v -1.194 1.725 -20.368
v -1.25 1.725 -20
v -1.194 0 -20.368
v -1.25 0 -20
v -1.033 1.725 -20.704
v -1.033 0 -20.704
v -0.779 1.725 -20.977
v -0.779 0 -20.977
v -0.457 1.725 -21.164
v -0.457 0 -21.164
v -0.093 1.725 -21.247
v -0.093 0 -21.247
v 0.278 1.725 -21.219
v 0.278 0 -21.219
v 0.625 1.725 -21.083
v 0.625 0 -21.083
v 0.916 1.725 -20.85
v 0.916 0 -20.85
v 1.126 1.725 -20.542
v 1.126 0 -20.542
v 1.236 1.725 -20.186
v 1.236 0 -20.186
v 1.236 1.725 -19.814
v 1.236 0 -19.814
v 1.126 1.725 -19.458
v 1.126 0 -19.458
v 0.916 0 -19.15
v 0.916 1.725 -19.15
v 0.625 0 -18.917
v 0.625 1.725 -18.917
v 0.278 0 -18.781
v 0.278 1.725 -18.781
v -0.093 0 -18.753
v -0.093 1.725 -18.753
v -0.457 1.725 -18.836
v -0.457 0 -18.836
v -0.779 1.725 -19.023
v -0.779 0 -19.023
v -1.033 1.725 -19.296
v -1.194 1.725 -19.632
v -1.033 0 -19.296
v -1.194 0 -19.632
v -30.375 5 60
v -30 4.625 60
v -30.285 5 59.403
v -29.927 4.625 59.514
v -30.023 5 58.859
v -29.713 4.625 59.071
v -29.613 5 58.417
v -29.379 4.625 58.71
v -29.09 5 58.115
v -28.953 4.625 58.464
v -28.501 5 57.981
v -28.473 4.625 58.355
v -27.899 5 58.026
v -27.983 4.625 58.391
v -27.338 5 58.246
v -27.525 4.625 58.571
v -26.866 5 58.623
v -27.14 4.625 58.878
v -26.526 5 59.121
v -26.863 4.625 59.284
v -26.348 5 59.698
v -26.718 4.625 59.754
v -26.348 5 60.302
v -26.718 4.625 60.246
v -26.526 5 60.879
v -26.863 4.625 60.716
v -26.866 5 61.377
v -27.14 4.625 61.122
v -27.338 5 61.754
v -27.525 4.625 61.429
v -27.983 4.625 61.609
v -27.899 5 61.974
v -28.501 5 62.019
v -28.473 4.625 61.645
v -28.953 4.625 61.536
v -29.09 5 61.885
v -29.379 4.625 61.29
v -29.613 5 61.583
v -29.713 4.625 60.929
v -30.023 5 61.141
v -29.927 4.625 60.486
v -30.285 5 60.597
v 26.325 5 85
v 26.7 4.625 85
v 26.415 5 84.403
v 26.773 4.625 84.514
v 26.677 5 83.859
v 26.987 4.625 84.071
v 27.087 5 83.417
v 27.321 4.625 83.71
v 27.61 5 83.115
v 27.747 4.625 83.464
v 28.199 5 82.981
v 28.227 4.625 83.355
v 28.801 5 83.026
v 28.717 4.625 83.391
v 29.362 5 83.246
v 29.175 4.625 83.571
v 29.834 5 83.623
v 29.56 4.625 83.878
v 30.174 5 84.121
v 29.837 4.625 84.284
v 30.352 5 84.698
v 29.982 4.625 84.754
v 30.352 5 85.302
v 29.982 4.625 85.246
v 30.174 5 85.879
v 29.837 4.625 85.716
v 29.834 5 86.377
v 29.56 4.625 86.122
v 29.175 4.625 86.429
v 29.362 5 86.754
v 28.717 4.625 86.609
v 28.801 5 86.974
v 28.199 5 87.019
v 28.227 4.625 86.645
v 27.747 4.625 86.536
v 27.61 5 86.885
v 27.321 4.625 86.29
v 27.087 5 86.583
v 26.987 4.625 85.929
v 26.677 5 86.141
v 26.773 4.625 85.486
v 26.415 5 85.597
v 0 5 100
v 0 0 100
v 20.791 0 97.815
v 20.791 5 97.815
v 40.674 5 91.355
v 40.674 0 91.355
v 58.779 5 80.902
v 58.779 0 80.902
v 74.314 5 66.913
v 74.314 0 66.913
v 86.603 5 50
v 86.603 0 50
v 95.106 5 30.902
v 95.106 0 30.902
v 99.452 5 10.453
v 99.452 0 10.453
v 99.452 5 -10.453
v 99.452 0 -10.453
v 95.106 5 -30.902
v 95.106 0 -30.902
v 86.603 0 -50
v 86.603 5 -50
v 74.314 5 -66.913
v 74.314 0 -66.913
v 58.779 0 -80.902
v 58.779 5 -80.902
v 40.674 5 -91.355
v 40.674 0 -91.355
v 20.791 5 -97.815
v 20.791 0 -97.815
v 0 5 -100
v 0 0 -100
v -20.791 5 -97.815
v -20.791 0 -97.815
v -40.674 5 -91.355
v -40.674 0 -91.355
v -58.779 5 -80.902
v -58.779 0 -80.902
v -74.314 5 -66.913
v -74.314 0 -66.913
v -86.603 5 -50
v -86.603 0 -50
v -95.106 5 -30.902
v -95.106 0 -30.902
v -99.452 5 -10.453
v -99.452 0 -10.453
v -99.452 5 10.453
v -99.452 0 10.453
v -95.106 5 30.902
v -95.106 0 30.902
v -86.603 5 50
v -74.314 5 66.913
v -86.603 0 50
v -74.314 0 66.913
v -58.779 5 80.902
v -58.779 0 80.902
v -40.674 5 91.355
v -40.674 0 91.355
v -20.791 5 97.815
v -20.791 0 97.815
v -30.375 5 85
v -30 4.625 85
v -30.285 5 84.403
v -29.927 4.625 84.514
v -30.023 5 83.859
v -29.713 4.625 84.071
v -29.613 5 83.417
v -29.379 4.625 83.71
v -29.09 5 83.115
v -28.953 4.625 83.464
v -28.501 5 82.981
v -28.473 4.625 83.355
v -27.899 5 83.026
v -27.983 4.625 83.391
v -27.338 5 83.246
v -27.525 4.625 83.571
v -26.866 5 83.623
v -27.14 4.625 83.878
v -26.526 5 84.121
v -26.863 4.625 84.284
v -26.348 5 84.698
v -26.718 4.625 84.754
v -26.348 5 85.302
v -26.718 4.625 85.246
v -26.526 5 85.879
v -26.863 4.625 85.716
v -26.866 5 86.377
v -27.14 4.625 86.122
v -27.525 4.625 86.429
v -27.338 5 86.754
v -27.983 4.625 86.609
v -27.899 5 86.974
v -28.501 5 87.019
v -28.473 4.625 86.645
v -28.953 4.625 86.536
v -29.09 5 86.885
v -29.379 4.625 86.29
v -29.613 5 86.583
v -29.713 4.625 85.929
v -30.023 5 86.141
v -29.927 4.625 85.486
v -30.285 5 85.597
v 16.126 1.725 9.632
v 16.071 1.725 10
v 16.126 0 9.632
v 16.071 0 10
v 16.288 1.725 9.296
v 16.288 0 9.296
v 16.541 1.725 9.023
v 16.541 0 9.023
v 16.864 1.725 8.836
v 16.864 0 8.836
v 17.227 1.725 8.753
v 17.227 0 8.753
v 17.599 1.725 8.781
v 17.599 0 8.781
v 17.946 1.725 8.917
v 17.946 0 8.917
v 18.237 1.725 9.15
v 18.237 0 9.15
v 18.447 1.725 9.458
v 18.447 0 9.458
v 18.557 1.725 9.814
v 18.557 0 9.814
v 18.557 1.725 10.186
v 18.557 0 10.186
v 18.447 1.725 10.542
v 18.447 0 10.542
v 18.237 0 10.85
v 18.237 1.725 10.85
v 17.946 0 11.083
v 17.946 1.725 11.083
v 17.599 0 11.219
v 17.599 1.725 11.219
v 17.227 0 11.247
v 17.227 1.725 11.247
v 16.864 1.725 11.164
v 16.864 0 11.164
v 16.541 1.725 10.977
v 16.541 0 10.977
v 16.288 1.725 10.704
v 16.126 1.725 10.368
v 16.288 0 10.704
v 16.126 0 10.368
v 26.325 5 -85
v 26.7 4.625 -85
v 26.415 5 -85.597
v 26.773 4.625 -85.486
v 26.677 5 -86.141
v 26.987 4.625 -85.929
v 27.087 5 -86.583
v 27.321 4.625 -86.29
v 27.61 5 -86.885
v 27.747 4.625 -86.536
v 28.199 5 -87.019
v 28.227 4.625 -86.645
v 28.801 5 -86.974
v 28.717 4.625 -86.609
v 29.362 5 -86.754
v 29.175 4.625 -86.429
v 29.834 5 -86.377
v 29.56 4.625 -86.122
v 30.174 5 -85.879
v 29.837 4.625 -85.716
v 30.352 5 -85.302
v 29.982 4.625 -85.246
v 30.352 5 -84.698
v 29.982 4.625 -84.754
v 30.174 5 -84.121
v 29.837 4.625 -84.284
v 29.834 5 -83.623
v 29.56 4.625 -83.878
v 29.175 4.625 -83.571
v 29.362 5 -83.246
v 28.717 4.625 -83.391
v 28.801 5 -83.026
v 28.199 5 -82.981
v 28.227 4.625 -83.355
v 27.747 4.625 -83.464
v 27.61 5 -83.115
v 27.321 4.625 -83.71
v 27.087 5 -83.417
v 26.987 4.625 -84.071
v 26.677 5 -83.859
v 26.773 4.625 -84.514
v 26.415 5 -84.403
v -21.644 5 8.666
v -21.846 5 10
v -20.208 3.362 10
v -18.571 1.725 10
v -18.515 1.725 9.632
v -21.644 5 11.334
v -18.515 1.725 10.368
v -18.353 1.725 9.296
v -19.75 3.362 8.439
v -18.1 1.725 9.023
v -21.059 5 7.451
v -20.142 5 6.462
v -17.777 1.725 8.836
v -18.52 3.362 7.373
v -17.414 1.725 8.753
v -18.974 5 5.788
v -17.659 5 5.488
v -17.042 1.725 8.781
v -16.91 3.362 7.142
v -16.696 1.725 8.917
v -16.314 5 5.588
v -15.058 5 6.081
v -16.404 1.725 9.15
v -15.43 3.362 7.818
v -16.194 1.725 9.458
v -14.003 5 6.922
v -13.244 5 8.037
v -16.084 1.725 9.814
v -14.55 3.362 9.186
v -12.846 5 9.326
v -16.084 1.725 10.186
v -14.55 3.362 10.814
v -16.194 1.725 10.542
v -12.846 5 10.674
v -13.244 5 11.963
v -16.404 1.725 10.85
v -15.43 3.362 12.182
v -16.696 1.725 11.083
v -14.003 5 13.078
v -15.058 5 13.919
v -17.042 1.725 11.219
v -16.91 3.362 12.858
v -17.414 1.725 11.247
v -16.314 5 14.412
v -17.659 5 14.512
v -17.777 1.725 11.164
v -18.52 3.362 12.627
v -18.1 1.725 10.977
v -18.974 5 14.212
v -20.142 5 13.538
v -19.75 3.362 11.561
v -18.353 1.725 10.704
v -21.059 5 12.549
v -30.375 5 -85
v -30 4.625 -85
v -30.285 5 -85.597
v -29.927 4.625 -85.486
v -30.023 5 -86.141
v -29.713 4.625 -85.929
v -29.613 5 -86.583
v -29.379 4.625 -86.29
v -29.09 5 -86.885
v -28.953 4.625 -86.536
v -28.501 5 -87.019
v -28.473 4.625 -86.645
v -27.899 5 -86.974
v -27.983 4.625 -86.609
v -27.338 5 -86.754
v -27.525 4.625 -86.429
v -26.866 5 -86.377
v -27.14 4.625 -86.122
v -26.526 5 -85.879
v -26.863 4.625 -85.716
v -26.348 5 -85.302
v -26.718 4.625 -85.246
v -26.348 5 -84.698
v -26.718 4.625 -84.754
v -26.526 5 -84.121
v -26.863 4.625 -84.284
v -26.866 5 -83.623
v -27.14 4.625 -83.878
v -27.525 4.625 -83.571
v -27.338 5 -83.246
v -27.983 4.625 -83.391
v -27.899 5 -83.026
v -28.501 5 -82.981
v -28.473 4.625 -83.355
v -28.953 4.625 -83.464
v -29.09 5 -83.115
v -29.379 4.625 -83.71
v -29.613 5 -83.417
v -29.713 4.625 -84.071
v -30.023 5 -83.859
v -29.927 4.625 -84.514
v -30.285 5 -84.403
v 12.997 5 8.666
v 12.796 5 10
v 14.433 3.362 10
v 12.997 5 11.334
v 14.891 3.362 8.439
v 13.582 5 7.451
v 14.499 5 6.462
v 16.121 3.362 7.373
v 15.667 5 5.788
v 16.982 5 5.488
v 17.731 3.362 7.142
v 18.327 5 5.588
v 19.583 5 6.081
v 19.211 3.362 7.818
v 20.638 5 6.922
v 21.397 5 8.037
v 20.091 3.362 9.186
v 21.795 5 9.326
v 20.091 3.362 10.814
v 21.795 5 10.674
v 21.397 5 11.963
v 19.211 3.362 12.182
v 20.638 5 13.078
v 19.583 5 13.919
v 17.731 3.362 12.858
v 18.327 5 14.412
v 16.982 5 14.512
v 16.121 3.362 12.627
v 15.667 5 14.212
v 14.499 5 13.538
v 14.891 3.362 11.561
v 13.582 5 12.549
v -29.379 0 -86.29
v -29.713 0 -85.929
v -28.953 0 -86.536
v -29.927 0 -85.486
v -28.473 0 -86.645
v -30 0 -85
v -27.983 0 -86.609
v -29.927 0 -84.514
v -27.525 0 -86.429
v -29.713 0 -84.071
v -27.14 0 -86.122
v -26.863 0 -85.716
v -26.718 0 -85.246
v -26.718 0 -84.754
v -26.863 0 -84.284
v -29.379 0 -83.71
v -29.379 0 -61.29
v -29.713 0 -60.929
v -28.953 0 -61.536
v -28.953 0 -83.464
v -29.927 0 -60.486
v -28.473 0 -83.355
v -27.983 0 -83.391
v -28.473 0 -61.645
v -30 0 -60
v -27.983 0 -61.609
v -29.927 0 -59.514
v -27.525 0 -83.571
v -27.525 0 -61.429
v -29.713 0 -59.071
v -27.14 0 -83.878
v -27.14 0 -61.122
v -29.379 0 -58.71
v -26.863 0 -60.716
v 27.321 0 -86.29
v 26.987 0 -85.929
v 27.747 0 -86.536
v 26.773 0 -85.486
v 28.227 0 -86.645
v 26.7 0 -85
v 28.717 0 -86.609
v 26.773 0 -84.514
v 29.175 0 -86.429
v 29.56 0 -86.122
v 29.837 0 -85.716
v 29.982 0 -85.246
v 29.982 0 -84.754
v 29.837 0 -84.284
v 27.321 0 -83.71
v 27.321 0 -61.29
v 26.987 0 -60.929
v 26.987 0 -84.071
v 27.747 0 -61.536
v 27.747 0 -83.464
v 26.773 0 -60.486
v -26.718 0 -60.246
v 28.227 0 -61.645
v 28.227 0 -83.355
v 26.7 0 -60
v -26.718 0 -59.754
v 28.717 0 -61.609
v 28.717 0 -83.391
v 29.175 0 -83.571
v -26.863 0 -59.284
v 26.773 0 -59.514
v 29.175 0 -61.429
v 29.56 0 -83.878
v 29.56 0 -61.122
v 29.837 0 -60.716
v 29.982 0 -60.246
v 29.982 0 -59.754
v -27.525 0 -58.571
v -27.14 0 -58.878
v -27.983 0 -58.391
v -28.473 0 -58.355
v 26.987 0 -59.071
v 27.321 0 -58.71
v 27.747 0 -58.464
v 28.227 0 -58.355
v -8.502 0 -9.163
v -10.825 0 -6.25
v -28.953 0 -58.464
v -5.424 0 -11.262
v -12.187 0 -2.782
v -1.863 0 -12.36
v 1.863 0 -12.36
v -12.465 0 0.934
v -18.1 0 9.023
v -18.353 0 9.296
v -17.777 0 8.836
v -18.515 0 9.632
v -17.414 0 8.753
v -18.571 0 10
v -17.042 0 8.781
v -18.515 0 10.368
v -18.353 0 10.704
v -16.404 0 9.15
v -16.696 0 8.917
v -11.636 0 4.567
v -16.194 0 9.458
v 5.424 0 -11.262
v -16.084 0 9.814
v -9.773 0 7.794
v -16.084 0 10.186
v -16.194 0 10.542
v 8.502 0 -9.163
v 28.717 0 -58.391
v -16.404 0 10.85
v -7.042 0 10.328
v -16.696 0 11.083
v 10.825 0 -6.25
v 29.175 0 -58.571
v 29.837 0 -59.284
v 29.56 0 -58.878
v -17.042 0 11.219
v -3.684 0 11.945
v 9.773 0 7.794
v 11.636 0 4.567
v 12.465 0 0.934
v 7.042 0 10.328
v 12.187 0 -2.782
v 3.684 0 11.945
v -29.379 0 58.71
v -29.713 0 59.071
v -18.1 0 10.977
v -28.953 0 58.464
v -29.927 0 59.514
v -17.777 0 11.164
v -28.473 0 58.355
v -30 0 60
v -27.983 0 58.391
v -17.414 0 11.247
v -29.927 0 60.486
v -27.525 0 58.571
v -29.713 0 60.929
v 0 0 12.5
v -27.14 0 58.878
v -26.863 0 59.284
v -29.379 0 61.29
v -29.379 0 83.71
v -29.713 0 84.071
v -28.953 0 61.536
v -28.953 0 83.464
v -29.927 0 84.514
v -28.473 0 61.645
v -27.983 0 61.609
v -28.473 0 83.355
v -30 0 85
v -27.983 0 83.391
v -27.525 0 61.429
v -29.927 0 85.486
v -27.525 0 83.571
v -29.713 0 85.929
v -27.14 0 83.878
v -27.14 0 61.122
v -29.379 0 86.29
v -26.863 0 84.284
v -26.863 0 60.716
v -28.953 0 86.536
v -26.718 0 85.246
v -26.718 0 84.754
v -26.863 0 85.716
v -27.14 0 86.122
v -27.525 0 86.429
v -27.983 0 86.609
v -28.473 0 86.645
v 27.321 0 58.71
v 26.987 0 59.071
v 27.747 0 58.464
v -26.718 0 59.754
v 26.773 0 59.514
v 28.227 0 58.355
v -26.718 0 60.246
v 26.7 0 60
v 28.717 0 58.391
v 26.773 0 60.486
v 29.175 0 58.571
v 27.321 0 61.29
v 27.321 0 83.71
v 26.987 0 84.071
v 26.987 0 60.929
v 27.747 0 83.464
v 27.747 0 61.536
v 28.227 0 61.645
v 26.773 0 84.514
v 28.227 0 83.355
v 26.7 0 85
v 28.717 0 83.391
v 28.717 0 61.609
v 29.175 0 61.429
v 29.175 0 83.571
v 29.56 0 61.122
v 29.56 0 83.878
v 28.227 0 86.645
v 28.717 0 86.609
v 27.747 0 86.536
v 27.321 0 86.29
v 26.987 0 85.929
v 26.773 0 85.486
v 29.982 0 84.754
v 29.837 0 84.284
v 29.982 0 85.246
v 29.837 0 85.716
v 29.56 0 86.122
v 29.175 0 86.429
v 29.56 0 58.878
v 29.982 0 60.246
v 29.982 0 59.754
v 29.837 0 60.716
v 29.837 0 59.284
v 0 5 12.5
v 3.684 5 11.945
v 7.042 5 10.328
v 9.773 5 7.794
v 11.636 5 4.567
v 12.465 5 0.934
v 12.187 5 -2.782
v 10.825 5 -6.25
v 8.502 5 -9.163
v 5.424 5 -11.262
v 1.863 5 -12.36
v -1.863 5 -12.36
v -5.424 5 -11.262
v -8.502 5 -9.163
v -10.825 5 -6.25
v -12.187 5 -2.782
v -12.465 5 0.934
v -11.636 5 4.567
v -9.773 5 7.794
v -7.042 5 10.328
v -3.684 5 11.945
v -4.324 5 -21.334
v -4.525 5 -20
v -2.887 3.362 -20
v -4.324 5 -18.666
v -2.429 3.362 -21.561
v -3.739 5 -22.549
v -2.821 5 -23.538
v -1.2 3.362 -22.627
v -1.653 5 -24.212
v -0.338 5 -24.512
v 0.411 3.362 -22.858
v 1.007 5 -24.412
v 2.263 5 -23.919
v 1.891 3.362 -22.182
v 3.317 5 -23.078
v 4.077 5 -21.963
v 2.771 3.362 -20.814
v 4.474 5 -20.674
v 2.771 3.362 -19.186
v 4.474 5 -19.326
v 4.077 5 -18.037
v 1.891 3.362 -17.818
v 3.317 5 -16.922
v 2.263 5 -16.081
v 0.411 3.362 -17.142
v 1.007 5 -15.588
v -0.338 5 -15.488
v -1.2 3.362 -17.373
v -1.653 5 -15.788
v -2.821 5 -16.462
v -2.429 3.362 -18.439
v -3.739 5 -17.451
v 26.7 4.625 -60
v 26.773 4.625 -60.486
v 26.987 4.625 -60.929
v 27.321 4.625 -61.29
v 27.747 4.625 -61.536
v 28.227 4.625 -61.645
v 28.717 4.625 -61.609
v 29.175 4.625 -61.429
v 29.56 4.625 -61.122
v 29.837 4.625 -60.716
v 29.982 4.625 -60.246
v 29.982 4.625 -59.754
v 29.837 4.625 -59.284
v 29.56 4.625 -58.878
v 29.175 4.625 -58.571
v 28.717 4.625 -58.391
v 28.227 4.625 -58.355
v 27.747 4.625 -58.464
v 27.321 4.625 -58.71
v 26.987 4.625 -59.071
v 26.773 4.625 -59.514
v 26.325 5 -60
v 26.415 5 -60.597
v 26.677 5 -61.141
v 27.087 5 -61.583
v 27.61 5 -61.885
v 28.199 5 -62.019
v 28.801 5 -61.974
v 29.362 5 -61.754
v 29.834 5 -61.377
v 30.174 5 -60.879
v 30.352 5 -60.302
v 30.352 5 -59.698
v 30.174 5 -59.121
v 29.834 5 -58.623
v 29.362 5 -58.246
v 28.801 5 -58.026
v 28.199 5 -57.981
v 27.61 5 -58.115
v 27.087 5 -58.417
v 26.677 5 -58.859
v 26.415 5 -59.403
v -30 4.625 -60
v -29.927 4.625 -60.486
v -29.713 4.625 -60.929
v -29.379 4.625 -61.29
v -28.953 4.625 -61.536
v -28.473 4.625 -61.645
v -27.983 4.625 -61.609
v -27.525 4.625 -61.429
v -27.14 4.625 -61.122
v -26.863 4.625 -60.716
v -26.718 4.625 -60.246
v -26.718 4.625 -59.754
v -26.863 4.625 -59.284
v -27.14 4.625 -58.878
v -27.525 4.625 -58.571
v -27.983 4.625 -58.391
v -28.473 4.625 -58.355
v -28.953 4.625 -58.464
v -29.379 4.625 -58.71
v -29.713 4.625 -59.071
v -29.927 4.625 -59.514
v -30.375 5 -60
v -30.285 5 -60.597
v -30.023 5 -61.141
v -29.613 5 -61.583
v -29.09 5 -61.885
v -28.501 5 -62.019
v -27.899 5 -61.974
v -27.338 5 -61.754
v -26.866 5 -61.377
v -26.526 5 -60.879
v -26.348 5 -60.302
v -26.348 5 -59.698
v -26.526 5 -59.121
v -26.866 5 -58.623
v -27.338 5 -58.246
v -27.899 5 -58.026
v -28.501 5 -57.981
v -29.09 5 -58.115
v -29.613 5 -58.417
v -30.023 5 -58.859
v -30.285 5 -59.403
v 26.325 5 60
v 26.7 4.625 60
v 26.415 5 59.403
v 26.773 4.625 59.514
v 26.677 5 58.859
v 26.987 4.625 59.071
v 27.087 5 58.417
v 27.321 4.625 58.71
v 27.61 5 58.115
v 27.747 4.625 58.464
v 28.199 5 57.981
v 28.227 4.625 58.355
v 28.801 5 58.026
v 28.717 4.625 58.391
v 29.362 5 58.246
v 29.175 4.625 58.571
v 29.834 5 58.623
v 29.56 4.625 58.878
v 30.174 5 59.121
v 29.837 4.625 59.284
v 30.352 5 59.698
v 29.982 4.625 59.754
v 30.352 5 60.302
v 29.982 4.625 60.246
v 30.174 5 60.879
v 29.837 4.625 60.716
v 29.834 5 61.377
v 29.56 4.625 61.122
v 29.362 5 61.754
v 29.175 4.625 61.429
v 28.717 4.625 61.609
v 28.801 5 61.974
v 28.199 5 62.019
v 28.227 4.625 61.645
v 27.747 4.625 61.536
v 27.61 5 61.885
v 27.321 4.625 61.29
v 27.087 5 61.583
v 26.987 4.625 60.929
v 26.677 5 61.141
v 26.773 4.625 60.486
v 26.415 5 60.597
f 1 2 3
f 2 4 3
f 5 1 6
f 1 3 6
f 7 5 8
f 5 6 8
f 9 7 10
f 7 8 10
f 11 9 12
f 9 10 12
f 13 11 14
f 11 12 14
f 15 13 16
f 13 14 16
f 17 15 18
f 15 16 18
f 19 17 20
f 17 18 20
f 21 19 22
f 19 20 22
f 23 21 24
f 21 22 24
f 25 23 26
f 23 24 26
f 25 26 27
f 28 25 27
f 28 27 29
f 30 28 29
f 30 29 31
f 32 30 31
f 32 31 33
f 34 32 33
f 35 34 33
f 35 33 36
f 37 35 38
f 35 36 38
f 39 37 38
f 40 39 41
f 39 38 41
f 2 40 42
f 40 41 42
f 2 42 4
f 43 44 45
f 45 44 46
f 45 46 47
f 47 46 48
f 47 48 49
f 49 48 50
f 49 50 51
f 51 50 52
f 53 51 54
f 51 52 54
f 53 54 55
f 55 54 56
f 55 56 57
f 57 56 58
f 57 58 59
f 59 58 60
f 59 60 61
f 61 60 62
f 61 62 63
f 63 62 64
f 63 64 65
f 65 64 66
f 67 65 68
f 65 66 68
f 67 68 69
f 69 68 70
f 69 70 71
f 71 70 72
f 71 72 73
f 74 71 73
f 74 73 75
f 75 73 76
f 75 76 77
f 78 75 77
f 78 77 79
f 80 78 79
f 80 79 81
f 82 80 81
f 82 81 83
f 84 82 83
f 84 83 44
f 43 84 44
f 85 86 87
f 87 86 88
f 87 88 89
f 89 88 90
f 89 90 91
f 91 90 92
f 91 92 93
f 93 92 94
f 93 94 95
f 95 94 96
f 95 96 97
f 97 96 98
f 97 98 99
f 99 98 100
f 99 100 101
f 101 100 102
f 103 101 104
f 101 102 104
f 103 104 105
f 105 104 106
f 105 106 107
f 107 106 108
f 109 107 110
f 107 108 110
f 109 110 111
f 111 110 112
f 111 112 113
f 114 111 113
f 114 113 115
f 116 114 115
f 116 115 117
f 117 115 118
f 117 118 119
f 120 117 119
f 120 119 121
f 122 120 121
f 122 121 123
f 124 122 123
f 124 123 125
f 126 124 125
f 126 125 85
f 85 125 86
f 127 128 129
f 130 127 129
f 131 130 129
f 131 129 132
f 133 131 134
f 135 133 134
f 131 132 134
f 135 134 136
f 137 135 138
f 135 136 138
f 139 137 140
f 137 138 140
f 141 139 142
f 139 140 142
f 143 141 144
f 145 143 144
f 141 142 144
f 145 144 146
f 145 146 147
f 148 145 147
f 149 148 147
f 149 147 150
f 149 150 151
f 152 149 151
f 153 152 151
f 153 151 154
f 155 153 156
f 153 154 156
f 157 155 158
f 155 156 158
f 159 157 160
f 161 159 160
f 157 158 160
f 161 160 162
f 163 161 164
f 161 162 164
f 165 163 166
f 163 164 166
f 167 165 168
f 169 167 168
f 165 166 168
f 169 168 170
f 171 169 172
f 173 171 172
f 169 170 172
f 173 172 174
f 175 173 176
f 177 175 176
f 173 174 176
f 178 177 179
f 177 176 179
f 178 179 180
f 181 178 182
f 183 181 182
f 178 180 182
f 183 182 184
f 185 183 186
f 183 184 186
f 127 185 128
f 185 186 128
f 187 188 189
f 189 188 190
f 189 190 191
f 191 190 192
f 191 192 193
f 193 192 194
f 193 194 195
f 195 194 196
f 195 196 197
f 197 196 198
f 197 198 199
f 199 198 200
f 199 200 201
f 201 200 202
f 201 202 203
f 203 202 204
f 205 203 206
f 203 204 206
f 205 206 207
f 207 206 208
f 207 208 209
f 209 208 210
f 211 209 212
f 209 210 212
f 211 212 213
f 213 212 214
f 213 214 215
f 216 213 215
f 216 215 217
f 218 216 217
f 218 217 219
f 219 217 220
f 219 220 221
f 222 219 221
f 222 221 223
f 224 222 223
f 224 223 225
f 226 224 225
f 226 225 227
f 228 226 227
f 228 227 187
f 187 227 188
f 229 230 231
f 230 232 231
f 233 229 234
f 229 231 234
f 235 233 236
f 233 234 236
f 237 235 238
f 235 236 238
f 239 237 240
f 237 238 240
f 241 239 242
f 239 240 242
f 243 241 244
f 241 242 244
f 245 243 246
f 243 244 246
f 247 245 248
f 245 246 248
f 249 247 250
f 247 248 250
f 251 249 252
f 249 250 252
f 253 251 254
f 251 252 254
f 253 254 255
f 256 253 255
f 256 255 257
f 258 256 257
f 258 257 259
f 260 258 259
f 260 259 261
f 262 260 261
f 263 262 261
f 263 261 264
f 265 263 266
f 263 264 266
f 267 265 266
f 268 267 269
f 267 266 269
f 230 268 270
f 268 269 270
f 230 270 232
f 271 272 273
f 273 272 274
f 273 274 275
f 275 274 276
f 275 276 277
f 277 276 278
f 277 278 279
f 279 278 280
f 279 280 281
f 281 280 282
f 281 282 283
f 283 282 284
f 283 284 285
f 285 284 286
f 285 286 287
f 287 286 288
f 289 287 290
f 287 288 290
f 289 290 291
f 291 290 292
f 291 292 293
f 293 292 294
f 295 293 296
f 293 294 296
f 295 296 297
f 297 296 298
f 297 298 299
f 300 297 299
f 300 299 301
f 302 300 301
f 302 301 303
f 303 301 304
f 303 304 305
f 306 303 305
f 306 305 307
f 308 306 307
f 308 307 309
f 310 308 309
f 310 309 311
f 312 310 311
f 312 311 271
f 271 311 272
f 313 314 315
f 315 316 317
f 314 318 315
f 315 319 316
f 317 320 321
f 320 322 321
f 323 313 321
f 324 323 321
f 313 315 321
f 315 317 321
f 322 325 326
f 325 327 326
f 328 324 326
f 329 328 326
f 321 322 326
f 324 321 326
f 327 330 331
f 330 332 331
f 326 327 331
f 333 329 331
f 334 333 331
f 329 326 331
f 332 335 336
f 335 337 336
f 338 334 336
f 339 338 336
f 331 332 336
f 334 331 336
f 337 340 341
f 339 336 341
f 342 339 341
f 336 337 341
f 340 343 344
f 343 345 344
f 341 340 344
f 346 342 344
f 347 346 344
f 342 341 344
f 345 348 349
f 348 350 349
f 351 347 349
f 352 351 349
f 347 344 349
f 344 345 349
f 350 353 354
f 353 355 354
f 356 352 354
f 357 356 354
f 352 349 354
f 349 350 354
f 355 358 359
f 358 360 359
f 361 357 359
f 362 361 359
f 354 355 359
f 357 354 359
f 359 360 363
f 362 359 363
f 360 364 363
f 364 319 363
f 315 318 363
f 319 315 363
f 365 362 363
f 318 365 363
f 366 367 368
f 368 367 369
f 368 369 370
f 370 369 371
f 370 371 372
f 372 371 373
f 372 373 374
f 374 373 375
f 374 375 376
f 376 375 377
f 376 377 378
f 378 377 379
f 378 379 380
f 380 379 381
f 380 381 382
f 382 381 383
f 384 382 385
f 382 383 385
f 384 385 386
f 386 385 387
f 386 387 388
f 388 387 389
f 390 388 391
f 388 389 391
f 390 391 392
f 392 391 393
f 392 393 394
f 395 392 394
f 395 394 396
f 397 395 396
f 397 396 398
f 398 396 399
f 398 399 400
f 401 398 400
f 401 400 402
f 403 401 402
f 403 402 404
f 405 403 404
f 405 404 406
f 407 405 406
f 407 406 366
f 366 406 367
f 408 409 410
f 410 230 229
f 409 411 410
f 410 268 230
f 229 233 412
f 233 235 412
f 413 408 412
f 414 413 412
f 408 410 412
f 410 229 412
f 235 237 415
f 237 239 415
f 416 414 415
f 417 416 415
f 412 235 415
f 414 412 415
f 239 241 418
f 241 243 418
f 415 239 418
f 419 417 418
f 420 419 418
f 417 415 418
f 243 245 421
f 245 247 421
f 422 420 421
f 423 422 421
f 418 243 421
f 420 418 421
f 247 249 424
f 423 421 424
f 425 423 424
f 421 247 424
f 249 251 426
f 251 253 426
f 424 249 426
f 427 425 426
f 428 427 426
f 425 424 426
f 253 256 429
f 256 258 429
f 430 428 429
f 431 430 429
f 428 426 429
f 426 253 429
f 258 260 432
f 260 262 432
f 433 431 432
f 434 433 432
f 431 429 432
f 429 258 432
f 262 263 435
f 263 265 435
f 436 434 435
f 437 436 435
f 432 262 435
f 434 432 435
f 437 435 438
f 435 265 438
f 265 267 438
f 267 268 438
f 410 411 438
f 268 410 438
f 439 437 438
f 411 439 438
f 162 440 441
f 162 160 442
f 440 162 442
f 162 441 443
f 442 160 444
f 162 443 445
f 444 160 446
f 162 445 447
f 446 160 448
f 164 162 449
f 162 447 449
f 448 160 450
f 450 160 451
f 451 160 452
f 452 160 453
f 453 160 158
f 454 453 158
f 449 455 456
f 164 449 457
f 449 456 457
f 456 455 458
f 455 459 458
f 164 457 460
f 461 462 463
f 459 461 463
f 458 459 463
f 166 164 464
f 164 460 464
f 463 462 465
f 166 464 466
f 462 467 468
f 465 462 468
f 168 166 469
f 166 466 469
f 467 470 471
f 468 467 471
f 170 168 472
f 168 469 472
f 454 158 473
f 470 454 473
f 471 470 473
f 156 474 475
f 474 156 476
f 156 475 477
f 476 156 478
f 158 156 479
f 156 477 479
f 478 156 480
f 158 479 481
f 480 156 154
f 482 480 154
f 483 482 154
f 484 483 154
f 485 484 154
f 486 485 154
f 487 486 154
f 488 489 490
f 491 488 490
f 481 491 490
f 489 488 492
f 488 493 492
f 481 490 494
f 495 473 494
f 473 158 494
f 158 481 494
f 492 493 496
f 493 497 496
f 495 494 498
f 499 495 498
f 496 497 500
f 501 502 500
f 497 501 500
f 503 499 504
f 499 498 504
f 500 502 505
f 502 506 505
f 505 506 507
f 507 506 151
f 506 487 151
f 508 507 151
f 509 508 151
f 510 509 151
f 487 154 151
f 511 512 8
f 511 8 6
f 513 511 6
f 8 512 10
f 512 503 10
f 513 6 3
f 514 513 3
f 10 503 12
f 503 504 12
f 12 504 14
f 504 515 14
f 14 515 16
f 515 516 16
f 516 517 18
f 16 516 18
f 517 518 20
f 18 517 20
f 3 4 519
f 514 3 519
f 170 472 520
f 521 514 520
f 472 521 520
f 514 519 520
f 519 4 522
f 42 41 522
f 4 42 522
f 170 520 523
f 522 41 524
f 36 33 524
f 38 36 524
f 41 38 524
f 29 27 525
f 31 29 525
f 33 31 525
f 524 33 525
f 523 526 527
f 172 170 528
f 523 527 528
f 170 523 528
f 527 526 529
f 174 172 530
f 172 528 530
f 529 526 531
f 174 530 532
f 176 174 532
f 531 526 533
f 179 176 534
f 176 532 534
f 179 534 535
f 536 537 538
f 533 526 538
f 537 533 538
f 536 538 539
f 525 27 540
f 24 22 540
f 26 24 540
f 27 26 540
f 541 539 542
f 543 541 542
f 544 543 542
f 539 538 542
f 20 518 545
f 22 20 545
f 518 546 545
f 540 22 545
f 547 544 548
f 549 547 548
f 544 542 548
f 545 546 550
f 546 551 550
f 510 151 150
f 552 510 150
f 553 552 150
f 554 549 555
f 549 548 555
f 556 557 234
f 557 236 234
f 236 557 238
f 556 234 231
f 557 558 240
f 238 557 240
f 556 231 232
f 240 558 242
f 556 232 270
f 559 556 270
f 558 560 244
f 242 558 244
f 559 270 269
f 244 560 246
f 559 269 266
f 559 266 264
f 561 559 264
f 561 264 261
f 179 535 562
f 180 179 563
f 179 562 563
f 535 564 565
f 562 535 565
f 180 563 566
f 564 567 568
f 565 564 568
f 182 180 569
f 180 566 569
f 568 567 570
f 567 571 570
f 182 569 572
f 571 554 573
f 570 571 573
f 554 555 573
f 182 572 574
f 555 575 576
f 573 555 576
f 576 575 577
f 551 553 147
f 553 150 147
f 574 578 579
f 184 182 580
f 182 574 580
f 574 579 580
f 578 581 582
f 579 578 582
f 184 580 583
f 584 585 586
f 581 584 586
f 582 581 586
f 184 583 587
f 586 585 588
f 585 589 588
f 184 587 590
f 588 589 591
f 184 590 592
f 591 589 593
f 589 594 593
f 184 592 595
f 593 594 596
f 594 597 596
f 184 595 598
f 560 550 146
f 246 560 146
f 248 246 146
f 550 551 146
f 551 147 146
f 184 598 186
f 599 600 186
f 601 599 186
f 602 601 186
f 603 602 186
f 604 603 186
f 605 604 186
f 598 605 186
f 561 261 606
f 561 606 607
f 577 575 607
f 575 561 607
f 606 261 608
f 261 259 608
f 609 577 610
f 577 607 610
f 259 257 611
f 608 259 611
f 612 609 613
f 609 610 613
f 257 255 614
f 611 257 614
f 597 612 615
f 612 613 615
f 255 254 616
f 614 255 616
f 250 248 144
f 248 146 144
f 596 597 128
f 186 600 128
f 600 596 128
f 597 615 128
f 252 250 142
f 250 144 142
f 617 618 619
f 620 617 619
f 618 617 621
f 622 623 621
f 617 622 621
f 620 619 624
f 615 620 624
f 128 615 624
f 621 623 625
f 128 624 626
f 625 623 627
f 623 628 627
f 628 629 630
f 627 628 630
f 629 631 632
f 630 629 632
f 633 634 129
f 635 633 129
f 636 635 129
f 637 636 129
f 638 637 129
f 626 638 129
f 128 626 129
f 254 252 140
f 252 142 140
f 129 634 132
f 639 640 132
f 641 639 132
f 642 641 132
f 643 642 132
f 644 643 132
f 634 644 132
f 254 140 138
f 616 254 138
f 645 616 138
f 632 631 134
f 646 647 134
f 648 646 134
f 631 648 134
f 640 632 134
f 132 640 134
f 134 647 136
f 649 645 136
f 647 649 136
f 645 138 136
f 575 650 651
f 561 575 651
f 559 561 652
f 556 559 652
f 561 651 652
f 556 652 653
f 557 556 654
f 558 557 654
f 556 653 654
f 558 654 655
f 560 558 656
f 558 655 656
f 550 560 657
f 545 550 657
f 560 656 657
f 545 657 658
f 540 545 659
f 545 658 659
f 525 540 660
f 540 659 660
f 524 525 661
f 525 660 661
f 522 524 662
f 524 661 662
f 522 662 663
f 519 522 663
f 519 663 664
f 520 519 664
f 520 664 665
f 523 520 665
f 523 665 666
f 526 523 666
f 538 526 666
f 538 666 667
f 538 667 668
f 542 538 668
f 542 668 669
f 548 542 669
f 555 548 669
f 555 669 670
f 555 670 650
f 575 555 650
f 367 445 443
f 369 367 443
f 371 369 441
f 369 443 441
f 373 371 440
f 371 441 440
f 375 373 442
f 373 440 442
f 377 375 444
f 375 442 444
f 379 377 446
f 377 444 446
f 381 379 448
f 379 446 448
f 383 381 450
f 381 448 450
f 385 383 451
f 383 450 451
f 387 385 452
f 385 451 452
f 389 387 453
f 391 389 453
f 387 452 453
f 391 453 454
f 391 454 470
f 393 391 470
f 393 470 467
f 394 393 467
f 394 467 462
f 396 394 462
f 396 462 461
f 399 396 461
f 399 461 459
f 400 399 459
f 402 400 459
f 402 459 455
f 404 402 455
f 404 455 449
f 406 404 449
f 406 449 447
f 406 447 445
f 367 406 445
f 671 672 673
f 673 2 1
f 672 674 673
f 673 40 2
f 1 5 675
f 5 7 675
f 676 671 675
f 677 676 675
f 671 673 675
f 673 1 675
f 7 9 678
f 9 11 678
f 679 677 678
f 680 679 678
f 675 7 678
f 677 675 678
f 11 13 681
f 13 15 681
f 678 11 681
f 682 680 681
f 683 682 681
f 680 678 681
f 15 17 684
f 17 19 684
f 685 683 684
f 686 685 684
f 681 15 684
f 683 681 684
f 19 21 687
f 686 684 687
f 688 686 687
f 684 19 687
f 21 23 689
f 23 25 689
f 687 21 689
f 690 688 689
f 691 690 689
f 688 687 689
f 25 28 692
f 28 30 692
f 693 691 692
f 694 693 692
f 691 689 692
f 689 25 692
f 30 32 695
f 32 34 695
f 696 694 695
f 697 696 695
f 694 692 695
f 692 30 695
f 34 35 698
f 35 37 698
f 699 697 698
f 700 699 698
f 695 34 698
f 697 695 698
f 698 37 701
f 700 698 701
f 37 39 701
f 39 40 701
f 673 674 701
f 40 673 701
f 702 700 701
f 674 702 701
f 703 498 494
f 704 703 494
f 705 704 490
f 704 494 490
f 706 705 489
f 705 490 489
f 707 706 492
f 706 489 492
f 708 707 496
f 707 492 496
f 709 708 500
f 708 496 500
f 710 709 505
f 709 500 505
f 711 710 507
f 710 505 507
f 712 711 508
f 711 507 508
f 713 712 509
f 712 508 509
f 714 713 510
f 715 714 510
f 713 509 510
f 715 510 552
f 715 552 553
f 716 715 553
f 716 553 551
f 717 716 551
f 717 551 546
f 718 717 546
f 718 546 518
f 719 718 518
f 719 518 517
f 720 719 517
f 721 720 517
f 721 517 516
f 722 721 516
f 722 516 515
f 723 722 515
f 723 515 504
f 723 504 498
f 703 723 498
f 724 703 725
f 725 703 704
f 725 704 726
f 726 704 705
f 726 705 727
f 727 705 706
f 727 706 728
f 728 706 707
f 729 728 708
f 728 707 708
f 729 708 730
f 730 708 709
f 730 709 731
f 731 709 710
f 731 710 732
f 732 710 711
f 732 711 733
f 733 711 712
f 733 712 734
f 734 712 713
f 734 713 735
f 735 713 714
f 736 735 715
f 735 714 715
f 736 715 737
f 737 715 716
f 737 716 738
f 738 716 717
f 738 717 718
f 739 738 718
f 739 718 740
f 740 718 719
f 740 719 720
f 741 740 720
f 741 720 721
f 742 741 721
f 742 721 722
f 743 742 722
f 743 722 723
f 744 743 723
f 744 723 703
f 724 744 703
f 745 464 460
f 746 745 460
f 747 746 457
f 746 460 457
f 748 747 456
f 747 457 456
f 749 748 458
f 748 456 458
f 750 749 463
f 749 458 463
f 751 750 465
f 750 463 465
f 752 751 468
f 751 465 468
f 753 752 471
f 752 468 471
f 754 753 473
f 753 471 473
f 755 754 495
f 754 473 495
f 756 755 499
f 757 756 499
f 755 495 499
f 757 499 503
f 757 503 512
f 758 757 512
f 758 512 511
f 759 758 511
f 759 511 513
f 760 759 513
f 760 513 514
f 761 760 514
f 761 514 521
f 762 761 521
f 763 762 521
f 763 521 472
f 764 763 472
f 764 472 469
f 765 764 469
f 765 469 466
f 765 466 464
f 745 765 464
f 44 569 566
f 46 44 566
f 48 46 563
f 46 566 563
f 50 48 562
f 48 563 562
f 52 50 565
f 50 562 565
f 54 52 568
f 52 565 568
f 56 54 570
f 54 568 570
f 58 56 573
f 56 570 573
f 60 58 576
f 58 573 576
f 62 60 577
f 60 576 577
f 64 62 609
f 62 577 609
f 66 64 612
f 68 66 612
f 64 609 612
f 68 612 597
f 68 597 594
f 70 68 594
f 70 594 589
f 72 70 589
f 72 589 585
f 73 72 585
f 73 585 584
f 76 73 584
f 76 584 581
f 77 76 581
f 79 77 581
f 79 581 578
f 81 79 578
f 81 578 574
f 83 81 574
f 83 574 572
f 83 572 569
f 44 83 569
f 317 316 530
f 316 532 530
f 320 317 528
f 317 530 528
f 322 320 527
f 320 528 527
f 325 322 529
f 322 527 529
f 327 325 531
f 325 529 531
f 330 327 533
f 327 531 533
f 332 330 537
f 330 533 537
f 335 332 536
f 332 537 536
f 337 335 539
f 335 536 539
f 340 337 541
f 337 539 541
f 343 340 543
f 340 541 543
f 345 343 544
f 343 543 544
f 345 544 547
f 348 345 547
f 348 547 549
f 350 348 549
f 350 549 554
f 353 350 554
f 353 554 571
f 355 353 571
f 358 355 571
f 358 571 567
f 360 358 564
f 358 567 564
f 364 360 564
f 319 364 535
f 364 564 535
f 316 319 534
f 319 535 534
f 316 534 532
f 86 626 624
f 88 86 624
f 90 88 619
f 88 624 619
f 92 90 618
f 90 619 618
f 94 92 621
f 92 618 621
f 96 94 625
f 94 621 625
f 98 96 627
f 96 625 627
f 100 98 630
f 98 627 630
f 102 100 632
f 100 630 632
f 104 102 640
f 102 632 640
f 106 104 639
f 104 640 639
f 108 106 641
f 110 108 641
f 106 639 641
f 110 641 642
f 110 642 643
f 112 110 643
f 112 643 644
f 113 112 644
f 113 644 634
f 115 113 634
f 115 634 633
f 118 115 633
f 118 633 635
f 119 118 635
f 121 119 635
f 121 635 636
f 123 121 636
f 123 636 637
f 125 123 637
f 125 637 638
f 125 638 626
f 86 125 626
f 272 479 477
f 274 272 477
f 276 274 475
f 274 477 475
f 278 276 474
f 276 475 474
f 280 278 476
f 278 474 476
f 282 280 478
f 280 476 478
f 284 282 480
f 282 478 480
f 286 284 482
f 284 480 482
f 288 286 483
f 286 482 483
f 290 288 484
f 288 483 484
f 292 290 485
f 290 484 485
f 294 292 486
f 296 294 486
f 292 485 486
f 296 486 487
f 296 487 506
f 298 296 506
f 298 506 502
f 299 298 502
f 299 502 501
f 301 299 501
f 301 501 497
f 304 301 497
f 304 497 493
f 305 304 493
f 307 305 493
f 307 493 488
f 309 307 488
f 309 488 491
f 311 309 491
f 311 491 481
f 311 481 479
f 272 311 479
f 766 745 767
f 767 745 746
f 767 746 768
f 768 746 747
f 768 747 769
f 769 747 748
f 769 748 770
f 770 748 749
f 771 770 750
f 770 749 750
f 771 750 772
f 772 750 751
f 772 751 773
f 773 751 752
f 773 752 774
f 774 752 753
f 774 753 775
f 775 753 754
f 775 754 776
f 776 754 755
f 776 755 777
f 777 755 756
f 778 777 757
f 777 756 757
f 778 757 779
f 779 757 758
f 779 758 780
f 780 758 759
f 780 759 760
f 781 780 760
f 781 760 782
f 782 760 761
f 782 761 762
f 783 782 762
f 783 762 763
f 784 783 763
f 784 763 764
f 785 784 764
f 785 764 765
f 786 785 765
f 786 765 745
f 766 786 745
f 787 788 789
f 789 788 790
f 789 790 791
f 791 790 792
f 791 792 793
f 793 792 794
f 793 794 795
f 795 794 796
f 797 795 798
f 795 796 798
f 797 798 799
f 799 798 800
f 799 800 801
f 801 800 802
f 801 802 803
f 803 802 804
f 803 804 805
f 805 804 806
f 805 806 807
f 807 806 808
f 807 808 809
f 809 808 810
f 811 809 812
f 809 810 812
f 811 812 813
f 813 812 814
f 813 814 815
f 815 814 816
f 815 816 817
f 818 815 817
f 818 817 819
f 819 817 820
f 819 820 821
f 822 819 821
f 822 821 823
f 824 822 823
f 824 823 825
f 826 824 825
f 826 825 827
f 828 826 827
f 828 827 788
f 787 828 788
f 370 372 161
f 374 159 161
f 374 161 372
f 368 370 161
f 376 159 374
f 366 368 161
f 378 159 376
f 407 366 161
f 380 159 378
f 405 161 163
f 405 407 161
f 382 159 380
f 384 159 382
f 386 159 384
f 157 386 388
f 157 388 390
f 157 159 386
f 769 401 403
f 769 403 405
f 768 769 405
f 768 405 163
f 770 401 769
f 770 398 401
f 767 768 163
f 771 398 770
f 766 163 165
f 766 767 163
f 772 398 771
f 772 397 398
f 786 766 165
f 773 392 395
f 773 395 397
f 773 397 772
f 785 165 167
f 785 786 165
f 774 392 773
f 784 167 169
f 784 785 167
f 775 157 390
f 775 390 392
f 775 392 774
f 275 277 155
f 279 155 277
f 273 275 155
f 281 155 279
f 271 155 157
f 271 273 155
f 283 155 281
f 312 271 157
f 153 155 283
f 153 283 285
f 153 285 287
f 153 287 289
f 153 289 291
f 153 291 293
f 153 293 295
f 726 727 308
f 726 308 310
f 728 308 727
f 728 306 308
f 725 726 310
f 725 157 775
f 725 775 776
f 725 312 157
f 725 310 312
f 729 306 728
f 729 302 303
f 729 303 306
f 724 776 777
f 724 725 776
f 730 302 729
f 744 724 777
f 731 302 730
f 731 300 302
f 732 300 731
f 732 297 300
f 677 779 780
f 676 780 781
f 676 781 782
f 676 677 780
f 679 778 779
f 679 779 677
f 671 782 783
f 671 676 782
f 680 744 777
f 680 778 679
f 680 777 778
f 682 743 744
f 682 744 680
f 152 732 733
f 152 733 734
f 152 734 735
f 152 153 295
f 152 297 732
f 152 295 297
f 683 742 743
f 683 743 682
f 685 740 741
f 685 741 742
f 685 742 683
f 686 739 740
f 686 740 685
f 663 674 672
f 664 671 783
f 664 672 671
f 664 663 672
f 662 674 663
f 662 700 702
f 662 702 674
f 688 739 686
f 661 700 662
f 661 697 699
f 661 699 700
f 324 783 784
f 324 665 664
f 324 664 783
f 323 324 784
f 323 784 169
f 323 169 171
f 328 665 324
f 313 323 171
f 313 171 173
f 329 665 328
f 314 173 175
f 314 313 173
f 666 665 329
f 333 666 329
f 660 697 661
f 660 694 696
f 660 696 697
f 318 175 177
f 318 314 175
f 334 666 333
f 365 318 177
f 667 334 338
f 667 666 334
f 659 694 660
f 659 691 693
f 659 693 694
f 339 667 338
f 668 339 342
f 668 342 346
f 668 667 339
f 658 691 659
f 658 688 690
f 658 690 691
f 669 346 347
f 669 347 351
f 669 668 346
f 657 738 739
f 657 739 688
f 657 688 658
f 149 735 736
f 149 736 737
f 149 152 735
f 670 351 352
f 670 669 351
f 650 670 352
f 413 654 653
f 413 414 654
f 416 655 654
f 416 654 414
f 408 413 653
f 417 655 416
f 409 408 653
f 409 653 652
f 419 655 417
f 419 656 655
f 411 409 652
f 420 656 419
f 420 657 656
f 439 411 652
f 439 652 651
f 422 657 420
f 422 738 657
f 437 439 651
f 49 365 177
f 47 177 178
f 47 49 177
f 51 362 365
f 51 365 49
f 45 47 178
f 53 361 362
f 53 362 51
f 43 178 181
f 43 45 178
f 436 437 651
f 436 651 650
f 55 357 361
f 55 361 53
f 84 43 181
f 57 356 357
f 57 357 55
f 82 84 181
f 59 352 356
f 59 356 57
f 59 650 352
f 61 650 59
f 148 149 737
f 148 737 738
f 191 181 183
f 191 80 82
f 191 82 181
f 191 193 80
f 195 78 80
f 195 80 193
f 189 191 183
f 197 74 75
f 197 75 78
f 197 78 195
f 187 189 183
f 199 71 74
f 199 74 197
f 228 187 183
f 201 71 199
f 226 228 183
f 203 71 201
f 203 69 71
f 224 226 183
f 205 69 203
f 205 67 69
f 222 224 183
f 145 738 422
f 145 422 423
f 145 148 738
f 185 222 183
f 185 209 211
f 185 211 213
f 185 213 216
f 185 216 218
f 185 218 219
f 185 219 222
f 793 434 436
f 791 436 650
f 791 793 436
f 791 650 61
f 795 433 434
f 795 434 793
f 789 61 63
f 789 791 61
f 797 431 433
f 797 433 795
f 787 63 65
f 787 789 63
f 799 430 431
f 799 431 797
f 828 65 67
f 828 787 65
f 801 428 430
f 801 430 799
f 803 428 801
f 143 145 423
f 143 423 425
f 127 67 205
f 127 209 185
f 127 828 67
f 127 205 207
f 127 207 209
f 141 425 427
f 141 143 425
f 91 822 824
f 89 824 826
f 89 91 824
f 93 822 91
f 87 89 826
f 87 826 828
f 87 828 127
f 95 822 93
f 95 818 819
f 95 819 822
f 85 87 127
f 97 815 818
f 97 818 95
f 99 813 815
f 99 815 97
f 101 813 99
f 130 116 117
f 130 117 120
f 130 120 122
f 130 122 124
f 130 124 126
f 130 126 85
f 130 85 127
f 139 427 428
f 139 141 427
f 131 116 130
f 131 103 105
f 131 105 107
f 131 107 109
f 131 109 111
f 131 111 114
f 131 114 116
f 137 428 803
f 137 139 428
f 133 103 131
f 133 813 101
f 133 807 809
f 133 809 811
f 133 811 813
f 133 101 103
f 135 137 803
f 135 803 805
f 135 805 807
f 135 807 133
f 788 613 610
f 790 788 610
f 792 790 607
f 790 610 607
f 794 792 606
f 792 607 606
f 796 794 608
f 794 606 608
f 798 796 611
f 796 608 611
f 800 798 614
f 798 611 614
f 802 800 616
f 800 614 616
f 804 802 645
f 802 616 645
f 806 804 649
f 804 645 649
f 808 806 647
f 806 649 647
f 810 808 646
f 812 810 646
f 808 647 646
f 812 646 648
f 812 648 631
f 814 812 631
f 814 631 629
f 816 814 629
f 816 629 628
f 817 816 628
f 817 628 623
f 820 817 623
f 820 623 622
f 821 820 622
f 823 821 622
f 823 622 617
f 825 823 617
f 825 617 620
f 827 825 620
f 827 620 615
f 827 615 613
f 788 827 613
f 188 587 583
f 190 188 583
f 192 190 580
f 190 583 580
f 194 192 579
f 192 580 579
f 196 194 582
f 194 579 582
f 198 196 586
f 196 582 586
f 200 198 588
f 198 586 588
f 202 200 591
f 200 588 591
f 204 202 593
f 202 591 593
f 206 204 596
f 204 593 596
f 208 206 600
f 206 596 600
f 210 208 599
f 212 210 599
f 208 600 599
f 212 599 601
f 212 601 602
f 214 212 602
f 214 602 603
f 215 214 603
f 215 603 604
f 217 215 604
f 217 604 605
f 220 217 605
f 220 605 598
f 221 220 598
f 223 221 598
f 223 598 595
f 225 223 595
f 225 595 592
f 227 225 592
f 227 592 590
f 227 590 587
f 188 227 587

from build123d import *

# Parameters (mm, degrees)
SKETCH_1_R                   = 100
EXTRUDE_1_DEPTH              = 5
HOLE_WIZARD_M3_1_D           = 2.5
HOLE_WIZARD_M3_1_CSINK_D     = 9.05
HOLE_WIZARD_M3_1_CSINK_ANGLE = 90
SKETCH_5_R                   = 12.5
CUT_EXTRUDE_1_DEPTH          = 142.509716981
HOLE_WIZARD_M4_2_D           = 3.3
HOLE_WIZARD_M4_2_DEPTH       = 5
HOLE_WIZARD_M4_2_CSINK_D     = 4.05
HOLE_WIZARD_M4_2_CSINK_ANGLE = 90


with BuildPart() as part:
    # 草图1 → 凸台-拉伸1 (new body)
    with BuildSketch(Plane(origin=(0, 0, 0), x_dir=(1, 0, 0), z_dir=(0, 1, 0))):
        with Locations(Location((0, 0, 0), (0, 0, 270))):
            Circle(SKETCH_1_R)
    extrude(amount=EXTRUDE_1_DEPTH)

    # M3 螺纹孔1 (through all)
    with Locations(Plane(origin=(0, 5, 0), x_dir=(1, 0, 0), z_dir=(0, 1, 0))):
        with Locations((0, 20), (17.320508076, -10), (-17.320508076, -10)):
            CounterSinkHole(HOLE_WIZARD_M3_1_D / 2, HOLE_WIZARD_M3_1_CSINK_D / 2, counter_sink_angle=HOLE_WIZARD_M3_1_CSINK_ANGLE)

    # 草图5 → 切除-拉伸1 (cut, through all)
    with BuildSketch(Plane(origin=(0, 5, 0), x_dir=(1, 0, 0), z_dir=(0, 1, 0))):
        with Locations(Location((0, 0, 0), (0, 0, 270))):
            Circle(SKETCH_5_R)
    extrude(amount=-CUT_EXTRUDE_1_DEPTH, mode=Mode.SUBTRACT)

    # M4 螺纹孔2
    with Locations(Plane(origin=(0, 5, 0), x_dir=(1, 0, 0), z_dir=(0, 1, 0))):
        with Locations((0, 0), (-28.35, 85), (28.35, 85), (28.35, -85), (-28.35, -85), (-28.35, 60), (28.35, 60), (-28.35, -60), (28.35, -60)):
            CounterSinkHole(HOLE_WIZARD_M4_2_D / 2, HOLE_WIZARD_M4_2_CSINK_D / 2, depth=HOLE_WIZARD_M4_2_DEPTH, counter_sink_angle=HOLE_WIZARD_M4_2_CSINK_ANGLE)


solid = part.part
